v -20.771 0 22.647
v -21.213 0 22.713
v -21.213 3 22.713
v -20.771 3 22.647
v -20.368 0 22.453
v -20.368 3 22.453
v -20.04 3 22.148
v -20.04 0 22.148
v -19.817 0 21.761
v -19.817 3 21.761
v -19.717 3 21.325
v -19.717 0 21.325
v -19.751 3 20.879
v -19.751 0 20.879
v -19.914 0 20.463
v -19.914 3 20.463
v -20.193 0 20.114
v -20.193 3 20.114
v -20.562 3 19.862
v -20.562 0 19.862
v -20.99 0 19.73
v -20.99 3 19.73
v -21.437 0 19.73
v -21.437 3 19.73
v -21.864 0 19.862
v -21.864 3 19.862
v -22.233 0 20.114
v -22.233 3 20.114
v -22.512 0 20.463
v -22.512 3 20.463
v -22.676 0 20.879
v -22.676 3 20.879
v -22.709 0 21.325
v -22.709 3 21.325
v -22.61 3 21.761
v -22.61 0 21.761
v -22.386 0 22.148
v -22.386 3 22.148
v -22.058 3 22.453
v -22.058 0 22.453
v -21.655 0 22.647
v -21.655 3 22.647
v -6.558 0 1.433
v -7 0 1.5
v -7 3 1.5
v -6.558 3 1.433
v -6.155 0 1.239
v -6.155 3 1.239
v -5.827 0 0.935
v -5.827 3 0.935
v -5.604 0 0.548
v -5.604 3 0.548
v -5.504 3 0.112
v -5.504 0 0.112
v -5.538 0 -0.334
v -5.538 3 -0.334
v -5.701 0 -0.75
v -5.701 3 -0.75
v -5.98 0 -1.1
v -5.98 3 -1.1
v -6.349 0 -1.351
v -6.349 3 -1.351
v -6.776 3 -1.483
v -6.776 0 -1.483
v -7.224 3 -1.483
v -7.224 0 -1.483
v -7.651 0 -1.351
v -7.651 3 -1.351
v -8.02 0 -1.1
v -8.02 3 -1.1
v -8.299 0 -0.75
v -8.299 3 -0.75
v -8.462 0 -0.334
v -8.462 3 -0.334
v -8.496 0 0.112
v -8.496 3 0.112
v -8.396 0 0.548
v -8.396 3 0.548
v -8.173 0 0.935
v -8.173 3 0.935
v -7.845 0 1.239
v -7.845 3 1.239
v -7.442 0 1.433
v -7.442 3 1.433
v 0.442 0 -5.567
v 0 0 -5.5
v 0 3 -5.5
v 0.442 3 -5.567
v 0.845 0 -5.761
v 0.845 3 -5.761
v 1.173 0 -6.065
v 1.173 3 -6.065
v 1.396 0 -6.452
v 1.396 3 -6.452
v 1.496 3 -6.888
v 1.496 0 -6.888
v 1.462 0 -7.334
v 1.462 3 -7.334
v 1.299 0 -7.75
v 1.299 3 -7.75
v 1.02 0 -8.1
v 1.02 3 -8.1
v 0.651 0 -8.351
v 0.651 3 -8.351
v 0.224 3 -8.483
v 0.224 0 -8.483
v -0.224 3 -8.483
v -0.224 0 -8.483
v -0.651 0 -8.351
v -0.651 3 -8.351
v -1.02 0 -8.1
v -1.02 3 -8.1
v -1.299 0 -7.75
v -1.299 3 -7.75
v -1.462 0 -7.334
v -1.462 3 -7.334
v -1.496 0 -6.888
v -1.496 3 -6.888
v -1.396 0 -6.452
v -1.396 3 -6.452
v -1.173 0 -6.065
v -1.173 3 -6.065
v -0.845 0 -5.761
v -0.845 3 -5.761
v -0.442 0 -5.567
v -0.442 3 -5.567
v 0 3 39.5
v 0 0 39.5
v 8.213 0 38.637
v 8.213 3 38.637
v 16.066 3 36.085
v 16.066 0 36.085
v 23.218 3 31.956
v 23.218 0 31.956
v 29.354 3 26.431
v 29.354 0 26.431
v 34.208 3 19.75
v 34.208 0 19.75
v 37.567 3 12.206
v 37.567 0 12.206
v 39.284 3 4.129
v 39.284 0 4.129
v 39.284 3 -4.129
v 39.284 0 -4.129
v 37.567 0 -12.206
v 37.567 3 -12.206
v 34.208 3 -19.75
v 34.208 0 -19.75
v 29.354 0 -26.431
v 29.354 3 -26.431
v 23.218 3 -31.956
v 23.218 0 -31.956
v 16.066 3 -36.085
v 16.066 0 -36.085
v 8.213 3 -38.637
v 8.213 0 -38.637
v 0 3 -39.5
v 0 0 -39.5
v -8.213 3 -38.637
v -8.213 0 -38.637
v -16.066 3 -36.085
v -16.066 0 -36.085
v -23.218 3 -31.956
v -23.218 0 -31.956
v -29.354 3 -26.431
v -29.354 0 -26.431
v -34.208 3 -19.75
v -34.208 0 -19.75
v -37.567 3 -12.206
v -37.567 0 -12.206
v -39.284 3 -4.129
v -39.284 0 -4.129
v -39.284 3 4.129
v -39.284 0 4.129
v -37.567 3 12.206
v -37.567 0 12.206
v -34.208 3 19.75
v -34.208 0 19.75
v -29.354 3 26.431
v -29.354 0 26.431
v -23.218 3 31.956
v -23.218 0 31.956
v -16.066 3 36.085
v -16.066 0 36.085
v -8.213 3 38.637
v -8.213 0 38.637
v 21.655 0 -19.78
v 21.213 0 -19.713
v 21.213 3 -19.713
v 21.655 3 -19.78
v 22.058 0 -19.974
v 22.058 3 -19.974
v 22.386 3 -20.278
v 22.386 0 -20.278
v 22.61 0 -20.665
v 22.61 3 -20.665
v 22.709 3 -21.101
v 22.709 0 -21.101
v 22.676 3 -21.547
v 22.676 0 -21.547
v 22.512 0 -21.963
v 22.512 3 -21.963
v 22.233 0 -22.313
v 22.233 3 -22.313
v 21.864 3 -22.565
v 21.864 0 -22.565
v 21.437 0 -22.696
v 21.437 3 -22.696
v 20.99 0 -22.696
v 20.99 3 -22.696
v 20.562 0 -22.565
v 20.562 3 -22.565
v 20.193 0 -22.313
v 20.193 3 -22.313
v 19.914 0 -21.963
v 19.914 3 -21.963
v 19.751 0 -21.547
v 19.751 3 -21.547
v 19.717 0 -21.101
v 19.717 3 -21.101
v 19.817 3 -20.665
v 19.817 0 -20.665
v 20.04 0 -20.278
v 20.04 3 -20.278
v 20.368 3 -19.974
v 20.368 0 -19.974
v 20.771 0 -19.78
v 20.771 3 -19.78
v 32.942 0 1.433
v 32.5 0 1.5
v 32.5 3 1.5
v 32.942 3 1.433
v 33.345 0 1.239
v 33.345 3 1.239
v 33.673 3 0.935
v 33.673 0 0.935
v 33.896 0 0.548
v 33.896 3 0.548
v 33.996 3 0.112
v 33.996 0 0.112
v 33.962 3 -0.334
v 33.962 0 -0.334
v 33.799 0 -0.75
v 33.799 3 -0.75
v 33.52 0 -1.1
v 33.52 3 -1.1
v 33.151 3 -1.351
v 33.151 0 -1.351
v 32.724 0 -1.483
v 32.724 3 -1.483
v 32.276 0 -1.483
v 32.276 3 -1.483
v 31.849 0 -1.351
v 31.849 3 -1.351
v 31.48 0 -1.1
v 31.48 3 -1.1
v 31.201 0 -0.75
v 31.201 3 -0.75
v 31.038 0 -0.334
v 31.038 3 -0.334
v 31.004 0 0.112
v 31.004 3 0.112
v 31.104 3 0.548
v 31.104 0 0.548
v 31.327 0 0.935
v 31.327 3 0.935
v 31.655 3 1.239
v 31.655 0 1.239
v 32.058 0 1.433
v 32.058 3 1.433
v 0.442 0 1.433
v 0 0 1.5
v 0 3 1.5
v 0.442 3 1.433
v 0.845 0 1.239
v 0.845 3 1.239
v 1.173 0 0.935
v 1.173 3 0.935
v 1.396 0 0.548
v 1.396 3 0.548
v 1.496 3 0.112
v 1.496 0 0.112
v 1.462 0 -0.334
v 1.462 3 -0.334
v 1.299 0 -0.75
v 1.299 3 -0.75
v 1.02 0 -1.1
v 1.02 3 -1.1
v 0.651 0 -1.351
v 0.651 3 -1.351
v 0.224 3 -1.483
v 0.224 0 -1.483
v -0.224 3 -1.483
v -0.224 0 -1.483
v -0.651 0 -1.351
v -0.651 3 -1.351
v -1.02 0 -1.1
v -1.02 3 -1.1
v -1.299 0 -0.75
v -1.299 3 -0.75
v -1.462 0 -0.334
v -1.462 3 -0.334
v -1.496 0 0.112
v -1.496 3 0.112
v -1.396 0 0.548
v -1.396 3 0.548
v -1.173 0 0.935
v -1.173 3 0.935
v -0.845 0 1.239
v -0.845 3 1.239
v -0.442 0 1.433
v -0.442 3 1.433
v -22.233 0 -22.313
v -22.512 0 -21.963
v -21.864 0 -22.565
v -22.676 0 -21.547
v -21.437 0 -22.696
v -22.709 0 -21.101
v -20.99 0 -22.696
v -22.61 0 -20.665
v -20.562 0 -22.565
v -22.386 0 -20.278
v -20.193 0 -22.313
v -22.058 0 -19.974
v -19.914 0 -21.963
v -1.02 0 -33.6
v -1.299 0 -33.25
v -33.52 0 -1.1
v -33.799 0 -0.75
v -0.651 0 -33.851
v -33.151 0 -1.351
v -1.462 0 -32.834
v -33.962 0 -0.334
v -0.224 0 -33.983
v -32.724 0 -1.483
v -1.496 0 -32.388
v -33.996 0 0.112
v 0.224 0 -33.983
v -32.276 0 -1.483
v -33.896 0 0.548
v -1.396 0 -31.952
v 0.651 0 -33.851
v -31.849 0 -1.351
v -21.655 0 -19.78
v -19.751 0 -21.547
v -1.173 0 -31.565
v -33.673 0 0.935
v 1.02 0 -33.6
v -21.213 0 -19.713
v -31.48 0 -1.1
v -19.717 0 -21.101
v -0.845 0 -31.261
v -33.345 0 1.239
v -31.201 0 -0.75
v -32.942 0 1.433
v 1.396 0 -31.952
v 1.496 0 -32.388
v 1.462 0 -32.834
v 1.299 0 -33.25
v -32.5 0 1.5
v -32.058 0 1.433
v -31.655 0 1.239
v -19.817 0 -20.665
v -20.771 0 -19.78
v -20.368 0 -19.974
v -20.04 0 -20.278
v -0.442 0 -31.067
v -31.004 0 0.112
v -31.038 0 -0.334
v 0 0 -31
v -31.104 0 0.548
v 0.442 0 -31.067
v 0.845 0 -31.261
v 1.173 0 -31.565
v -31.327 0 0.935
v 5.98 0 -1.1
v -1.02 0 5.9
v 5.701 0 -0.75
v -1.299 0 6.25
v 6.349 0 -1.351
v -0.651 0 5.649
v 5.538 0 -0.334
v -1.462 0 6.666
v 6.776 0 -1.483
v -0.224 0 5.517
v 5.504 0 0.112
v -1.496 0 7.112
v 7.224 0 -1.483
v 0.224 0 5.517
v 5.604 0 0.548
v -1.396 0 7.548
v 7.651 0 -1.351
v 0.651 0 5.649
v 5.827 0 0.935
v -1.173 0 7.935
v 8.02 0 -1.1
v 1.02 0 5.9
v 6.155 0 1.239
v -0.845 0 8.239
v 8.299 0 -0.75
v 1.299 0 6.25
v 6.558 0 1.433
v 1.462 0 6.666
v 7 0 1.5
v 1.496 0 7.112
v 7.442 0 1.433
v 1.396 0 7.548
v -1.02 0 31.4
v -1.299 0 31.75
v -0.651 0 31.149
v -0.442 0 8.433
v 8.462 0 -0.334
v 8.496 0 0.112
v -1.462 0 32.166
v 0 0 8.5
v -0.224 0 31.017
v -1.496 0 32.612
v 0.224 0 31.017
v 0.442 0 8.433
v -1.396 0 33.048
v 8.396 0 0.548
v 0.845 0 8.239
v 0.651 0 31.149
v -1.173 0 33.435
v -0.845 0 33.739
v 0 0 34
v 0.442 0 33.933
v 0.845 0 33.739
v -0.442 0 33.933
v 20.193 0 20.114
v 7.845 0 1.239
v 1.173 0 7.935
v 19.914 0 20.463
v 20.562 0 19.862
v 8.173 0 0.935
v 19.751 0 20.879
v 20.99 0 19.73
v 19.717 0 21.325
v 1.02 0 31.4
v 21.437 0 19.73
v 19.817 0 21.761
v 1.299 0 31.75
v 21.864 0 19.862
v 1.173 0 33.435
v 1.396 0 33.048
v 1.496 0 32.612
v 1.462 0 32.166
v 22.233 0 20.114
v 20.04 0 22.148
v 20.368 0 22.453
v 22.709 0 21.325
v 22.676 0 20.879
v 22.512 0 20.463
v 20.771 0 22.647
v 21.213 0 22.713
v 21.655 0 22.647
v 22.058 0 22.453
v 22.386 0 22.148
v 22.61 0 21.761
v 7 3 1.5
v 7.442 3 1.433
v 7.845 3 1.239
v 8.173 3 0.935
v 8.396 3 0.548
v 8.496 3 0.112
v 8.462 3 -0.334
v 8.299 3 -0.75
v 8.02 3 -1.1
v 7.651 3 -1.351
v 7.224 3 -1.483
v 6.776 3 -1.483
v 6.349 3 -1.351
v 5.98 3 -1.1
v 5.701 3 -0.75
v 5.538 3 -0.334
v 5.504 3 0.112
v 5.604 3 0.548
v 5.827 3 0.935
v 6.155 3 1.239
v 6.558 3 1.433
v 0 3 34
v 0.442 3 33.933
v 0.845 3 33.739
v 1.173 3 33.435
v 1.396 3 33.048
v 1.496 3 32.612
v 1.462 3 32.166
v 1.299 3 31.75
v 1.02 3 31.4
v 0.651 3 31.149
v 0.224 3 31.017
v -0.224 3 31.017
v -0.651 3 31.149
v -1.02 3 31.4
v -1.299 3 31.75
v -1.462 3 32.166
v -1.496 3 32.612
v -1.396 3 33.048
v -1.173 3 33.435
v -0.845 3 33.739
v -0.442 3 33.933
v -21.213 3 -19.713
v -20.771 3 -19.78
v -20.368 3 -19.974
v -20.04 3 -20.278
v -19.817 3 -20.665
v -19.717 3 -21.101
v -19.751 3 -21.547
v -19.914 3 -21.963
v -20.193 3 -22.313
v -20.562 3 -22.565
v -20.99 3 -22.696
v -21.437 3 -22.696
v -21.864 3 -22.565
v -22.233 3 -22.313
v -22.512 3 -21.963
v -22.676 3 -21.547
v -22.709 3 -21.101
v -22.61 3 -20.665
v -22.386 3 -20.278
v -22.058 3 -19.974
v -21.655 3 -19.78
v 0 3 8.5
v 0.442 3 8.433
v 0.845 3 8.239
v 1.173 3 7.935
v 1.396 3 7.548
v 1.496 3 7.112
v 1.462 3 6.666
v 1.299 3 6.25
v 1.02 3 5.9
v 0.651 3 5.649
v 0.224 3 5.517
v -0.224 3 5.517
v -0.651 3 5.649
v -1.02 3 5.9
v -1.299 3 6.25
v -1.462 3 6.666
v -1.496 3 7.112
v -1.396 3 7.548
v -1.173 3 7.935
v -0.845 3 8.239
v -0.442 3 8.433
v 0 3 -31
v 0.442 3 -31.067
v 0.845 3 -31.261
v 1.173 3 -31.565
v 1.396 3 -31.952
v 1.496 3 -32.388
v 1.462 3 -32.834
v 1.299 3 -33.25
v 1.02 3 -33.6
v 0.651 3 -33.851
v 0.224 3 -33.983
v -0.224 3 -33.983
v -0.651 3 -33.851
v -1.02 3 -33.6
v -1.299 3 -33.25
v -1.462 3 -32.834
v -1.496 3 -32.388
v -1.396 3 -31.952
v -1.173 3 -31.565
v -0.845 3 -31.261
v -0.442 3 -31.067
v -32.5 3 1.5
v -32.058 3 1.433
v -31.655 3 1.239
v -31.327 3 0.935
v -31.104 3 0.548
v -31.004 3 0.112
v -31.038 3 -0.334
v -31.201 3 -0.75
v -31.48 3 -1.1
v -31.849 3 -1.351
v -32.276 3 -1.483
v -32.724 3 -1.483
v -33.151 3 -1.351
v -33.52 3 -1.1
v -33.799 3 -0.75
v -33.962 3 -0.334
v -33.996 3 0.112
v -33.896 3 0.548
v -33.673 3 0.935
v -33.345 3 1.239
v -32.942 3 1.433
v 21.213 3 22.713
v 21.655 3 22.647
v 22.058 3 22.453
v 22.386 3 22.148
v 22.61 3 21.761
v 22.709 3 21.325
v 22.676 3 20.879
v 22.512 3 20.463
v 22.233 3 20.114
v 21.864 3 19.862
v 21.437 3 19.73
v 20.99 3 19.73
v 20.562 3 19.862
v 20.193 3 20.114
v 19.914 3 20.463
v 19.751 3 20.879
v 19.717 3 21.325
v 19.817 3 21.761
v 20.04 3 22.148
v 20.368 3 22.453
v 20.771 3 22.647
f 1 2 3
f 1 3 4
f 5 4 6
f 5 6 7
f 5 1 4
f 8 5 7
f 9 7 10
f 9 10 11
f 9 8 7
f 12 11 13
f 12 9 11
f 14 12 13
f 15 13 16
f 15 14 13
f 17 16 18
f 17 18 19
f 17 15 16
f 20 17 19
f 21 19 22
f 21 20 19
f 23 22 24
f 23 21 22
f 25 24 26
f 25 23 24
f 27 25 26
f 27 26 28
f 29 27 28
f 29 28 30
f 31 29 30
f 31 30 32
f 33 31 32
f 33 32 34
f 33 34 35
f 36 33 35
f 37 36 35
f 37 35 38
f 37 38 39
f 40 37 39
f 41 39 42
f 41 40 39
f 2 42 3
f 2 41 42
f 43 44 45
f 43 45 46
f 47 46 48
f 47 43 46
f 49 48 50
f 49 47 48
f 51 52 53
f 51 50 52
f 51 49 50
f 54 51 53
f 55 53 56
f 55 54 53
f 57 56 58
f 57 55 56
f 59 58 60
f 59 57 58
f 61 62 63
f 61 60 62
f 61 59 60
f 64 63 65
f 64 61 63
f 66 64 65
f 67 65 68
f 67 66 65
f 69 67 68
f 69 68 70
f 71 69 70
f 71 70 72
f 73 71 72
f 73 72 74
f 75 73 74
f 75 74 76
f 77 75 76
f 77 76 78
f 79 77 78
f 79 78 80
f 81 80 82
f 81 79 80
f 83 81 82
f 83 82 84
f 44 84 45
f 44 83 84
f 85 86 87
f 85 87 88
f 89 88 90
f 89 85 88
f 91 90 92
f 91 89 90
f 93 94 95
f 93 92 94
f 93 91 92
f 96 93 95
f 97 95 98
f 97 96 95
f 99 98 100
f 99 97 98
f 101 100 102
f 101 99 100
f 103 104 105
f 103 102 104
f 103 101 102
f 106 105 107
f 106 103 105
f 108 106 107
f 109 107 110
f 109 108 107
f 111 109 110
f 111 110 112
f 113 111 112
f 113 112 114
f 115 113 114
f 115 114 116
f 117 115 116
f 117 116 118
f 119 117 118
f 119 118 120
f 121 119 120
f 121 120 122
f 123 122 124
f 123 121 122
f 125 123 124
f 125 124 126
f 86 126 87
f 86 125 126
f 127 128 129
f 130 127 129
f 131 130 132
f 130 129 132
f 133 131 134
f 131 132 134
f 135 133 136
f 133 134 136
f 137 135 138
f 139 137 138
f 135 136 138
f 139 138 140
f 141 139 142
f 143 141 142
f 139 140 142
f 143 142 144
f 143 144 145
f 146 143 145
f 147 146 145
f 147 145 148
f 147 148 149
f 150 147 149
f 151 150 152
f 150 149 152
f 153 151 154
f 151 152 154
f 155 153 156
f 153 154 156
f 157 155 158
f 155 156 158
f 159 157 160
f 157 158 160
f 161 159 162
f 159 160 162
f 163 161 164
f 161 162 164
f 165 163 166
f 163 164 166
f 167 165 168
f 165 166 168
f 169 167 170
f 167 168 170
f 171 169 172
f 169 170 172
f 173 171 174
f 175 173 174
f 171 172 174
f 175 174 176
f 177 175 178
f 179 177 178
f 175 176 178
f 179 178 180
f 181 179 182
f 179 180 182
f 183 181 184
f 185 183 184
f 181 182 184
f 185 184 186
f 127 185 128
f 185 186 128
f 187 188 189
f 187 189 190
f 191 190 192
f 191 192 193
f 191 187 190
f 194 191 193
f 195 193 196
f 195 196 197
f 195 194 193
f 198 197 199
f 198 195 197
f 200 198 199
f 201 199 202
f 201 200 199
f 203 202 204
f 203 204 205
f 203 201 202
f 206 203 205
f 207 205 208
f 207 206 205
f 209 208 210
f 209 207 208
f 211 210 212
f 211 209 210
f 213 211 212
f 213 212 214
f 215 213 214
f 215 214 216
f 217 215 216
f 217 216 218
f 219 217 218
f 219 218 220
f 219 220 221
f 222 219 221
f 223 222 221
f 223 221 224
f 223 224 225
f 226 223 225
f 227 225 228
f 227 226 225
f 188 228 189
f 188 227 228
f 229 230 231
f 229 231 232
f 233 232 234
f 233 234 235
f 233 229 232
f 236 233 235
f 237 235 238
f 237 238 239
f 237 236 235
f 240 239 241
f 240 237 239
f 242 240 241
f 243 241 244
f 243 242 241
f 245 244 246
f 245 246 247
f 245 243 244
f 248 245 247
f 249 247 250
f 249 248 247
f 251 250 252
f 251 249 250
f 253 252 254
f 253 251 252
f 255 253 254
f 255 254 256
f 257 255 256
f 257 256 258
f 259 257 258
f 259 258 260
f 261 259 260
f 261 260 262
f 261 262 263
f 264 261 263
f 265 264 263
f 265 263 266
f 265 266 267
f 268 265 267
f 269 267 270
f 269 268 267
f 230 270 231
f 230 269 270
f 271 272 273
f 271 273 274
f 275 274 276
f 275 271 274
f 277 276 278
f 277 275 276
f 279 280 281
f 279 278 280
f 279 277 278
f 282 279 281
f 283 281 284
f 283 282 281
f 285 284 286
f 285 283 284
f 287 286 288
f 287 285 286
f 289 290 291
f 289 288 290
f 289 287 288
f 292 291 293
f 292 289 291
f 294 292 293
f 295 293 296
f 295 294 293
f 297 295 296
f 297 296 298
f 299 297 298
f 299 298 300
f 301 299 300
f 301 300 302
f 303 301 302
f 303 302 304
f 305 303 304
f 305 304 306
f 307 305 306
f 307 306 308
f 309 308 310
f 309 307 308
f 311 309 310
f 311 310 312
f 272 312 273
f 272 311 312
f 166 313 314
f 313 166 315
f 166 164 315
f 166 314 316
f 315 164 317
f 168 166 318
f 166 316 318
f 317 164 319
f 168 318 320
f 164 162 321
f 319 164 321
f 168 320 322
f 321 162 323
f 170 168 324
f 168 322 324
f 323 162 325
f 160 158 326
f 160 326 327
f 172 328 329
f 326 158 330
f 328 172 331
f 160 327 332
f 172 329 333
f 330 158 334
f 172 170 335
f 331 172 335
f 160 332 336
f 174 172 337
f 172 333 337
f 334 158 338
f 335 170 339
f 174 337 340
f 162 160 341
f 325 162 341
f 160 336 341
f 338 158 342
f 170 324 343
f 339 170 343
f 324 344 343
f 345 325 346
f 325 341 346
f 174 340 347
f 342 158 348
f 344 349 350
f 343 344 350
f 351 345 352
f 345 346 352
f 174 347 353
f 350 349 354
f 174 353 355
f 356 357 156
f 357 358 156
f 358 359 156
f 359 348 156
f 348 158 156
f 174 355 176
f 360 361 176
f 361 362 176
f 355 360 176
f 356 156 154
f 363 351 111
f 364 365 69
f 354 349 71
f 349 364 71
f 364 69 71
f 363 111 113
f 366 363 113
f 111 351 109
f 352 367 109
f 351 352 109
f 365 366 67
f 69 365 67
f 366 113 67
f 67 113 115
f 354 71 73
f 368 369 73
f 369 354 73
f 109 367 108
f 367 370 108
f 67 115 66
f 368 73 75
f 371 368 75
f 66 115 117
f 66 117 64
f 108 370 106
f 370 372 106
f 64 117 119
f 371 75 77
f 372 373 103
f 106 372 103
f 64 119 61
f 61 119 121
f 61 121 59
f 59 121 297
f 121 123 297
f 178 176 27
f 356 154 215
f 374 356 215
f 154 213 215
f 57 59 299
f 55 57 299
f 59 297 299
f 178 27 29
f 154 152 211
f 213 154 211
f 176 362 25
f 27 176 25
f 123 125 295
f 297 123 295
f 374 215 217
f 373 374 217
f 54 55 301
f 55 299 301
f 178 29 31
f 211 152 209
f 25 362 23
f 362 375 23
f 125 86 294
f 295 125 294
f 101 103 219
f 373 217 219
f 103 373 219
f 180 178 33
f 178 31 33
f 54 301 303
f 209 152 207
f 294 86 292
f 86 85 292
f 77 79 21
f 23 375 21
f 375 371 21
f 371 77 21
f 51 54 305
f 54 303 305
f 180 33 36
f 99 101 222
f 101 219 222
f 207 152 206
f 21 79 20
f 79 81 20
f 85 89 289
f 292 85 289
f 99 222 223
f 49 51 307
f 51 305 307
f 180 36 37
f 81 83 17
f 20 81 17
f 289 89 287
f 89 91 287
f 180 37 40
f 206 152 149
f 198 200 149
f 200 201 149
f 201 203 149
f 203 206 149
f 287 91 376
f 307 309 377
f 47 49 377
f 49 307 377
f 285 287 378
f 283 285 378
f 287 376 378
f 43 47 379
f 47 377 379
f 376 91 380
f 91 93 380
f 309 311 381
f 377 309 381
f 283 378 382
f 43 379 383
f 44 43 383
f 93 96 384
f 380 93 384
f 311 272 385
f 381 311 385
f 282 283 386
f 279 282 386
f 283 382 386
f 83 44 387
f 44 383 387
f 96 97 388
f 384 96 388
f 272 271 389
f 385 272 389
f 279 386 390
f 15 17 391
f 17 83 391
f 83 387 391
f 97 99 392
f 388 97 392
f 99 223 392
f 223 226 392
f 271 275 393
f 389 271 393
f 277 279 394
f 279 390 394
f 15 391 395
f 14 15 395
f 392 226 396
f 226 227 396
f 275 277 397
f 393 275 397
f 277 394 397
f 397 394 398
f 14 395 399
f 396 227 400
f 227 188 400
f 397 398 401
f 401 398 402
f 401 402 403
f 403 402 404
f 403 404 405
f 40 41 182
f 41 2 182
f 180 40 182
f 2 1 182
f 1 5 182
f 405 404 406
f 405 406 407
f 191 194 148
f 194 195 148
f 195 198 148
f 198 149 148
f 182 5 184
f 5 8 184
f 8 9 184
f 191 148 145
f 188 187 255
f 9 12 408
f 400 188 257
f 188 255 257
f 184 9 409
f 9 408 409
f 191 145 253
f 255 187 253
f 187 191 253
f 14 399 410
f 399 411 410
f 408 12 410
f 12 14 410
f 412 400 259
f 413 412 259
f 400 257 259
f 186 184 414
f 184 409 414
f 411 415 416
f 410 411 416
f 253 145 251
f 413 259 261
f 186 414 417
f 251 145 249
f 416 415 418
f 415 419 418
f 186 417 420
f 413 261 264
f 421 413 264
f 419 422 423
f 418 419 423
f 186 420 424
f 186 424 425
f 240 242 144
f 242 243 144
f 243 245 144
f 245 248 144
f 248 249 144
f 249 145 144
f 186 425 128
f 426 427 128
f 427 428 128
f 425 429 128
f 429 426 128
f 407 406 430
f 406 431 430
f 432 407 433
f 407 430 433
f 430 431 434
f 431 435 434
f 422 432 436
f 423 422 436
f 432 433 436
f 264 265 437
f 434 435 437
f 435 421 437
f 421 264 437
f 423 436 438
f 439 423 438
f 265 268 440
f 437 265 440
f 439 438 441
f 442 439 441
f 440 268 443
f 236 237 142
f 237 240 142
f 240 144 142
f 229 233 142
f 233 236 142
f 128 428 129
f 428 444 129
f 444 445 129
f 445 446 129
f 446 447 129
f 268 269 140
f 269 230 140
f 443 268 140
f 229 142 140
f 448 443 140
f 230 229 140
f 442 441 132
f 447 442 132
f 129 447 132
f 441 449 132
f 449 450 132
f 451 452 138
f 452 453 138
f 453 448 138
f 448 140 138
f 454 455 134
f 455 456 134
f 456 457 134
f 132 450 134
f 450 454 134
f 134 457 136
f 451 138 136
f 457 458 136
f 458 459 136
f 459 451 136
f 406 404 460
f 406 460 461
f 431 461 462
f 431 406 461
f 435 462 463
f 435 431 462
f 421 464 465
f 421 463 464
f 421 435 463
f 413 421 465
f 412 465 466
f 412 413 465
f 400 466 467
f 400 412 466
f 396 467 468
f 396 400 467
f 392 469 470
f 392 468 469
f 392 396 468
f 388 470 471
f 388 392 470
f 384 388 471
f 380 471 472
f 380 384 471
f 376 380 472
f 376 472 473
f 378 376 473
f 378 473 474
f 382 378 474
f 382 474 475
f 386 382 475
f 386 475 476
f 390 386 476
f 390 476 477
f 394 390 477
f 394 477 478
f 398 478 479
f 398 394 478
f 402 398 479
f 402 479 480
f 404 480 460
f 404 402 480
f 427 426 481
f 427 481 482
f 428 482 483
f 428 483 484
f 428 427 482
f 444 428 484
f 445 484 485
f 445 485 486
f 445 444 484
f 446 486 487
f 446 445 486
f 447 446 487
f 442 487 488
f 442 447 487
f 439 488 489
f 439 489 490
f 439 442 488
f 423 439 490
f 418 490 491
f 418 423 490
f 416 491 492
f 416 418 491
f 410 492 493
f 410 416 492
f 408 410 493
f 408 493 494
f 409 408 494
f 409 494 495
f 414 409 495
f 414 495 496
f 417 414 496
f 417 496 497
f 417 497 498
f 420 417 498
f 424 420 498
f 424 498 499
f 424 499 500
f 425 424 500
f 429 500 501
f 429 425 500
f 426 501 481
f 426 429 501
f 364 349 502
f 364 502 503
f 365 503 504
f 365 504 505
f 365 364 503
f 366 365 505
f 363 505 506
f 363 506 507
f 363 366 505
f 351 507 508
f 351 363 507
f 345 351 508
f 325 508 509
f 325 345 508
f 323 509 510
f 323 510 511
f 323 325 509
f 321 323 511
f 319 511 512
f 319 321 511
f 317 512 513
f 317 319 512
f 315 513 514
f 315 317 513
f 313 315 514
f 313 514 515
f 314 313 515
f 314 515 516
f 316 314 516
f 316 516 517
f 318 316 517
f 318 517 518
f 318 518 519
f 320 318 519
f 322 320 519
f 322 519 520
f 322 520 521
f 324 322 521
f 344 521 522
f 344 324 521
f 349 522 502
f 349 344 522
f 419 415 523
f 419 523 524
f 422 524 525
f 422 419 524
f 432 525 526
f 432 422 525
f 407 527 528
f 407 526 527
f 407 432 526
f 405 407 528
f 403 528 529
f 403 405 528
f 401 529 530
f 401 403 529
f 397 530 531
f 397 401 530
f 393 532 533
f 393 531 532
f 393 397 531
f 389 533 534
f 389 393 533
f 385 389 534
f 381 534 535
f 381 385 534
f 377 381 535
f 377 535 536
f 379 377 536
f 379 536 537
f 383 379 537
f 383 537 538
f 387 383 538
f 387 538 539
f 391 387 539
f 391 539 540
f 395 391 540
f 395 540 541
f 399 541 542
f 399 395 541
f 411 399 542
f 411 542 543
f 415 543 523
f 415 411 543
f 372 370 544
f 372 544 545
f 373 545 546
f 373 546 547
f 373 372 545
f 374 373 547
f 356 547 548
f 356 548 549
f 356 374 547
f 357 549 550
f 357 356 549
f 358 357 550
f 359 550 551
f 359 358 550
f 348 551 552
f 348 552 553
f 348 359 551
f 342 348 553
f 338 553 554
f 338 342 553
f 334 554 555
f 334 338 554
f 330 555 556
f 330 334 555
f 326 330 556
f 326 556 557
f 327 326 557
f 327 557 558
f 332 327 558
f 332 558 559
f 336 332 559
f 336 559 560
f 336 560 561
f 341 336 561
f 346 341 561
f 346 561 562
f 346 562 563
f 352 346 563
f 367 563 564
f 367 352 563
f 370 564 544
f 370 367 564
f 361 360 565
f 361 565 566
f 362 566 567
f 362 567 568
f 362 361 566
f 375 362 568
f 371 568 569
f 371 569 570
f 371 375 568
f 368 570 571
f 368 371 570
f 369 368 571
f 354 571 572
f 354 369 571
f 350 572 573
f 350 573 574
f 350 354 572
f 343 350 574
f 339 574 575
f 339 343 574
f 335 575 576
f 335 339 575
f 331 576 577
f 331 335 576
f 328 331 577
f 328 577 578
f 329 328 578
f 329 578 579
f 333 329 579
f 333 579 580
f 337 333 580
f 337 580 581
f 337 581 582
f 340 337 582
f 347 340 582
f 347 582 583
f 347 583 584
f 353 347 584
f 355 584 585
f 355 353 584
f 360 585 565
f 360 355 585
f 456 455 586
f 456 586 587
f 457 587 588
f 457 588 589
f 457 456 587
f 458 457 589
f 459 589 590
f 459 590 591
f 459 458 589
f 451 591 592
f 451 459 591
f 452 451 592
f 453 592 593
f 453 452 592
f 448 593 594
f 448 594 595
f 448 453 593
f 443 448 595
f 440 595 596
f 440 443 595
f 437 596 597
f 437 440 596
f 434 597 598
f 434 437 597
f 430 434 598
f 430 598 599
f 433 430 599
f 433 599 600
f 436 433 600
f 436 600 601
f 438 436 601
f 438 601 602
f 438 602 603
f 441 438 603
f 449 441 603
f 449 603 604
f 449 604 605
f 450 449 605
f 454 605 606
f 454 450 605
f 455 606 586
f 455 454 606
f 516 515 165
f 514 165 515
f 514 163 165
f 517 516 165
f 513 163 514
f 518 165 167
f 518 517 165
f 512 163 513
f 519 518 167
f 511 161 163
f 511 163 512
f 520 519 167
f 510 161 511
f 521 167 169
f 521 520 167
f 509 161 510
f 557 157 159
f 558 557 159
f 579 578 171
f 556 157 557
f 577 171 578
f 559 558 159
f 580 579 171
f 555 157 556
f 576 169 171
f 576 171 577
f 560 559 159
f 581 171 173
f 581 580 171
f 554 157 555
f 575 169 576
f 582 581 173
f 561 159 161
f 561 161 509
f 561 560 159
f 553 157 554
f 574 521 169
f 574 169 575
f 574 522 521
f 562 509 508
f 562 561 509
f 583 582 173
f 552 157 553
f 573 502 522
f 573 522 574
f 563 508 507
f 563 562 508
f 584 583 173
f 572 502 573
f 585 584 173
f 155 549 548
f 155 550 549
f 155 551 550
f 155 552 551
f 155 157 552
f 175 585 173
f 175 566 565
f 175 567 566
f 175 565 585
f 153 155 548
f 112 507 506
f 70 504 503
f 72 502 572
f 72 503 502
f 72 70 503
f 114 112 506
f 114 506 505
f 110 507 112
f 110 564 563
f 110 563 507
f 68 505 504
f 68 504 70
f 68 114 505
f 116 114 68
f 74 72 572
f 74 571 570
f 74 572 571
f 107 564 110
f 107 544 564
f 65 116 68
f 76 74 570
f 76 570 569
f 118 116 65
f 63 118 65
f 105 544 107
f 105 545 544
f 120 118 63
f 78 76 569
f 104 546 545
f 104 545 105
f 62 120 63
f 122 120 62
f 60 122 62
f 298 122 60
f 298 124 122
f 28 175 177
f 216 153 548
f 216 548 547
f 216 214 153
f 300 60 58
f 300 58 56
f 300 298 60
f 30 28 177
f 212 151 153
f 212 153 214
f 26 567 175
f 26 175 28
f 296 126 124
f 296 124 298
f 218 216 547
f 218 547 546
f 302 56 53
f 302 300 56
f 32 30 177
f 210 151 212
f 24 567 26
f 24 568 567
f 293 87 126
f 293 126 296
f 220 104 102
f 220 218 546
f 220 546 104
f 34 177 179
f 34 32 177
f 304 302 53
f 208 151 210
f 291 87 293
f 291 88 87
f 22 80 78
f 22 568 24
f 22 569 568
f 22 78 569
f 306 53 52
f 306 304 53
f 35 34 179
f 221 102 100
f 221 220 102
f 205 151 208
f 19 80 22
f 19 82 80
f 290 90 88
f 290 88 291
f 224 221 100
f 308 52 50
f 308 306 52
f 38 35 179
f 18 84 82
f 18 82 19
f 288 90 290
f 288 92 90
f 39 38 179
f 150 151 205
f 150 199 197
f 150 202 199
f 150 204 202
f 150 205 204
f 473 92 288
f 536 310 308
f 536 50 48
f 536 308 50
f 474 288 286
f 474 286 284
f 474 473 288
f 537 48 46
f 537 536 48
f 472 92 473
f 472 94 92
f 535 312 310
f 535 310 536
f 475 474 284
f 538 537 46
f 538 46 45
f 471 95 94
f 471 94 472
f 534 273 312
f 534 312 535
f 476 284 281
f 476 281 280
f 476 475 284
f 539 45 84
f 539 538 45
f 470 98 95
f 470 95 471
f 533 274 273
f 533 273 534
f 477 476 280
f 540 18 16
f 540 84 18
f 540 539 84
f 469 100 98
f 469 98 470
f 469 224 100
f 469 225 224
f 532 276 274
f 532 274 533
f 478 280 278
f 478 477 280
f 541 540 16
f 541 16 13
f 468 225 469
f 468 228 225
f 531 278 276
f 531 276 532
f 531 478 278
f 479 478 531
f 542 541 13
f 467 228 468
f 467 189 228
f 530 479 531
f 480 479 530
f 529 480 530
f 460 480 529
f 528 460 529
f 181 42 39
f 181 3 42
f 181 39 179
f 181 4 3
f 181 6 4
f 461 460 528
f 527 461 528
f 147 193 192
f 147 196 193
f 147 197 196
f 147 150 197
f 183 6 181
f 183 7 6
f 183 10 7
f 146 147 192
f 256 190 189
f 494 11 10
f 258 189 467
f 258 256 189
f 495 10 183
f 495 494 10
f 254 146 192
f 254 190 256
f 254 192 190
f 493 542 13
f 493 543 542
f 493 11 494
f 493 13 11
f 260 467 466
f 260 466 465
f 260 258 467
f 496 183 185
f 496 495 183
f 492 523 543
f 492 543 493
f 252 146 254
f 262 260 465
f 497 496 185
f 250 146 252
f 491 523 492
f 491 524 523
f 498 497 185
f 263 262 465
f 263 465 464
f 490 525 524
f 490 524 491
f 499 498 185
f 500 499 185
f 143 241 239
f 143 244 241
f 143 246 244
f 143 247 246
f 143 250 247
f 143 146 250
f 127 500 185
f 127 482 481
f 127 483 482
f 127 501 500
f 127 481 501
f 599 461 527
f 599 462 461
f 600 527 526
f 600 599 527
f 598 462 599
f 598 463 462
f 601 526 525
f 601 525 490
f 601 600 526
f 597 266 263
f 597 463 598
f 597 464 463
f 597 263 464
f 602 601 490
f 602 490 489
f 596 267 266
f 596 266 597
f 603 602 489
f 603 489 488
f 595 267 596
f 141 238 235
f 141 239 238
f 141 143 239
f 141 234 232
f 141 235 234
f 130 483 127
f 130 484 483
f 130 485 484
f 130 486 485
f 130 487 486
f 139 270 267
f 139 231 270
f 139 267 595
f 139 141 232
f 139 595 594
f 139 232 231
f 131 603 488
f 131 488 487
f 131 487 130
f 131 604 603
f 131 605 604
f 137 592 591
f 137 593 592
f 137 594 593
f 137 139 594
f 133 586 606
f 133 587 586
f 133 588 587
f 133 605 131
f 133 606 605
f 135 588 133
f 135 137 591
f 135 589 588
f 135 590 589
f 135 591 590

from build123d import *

# Parameters (mm, degrees)
SKETCH_1_R               = 39.5
SKETCH_1_R_2             = 1.5
EXTRUDE_1_DEPTH          = 3
CUT_EXTRUDE_1_DEPTH      = 56.941934182
CUT_EXTRUDE_1_DEPTH_BACK = 56.941934182
SKETCH_2_R               = 1.5


with BuildPart() as part:
    # 草图1 → 凸台-拉伸1 (new body)
    with BuildSketch(Plane(origin=(0, 0, 0), x_dir=(1, 0, 0), z_dir=(0, 1, 0))):
        with Locations(Location((0, 0, 0), (0, 0, 270))):
            Circle(SKETCH_1_R)
        with Locations(Location((0, 32.5, 0), (0, 0, 270))):
            Circle(SKETCH_1_R_2, mode=Mode.SUBTRACT)
        with Locations(Location((32.5, 0, 0), (0, 0, 270))):
            Circle(SKETCH_1_R_2, mode=Mode.SUBTRACT)
        with Locations(Location((0, -32.5, 0), (0, 0, 270))):
            Circle(SKETCH_1_R_2, mode=Mode.SUBTRACT)
        with Locations(Location((-32.5, 0, 0), (0, 0, 270))):
            Circle(SKETCH_1_R_2, mode=Mode.SUBTRACT)
        with Locations(Location((21.213203436, 21.213203436, 0), (0, 0, 270))):
            Circle(SKETCH_1_R_2, mode=Mode.SUBTRACT)
        with Locations(Location((21.213203436, -21.213203436, 0), (0, 0, 270))):
            Circle(SKETCH_1_R_2, mode=Mode.SUBTRACT)
        with Locations(Location((-21.213203436, -21.213203436, 0), (0, 0, 270))):
            Circle(SKETCH_1_R_2, mode=Mode.SUBTRACT)
        with Locations(Location((-21.213203436, 21.213203436, 0), (0, 0, 270))):
            Circle(SKETCH_1_R_2, mode=Mode.SUBTRACT)
    extrude(amount=EXTRUDE_1_DEPTH)

    # 草图2 → 切除-拉伸1 (cut, two sides: drawn at the far end of the back side and taken through both)
    with BuildSketch(Plane(origin=(0, 3, 0), x_dir=(1, 0, 0), z_dir=(0, 1, 0)).offset(-CUT_EXTRUDE_1_DEPTH_BACK)):
        with Locations(Location((0, 0, 0), (0, 0, 270))):
            Circle(SKETCH_2_R)
        with Locations(Location((0, 7, 0), (0, 0, 270))):
            Circle(SKETCH_2_R)
        with Locations(Location((7, 0, 0), (0, 0, 270))):
            Circle(SKETCH_2_R)
        with Locations(Location((0, -7, 0), (0, 0, 270))):
            Circle(SKETCH_2_R)
        with Locations(Location((-7, 0, 0), (0, 0, 270))):
            Circle(SKETCH_2_R)
    extrude(amount=CUT_EXTRUDE_1_DEPTH + CUT_EXTRUDE_1_DEPTH_BACK, mode=Mode.SUBTRACT)


solid = part.part
